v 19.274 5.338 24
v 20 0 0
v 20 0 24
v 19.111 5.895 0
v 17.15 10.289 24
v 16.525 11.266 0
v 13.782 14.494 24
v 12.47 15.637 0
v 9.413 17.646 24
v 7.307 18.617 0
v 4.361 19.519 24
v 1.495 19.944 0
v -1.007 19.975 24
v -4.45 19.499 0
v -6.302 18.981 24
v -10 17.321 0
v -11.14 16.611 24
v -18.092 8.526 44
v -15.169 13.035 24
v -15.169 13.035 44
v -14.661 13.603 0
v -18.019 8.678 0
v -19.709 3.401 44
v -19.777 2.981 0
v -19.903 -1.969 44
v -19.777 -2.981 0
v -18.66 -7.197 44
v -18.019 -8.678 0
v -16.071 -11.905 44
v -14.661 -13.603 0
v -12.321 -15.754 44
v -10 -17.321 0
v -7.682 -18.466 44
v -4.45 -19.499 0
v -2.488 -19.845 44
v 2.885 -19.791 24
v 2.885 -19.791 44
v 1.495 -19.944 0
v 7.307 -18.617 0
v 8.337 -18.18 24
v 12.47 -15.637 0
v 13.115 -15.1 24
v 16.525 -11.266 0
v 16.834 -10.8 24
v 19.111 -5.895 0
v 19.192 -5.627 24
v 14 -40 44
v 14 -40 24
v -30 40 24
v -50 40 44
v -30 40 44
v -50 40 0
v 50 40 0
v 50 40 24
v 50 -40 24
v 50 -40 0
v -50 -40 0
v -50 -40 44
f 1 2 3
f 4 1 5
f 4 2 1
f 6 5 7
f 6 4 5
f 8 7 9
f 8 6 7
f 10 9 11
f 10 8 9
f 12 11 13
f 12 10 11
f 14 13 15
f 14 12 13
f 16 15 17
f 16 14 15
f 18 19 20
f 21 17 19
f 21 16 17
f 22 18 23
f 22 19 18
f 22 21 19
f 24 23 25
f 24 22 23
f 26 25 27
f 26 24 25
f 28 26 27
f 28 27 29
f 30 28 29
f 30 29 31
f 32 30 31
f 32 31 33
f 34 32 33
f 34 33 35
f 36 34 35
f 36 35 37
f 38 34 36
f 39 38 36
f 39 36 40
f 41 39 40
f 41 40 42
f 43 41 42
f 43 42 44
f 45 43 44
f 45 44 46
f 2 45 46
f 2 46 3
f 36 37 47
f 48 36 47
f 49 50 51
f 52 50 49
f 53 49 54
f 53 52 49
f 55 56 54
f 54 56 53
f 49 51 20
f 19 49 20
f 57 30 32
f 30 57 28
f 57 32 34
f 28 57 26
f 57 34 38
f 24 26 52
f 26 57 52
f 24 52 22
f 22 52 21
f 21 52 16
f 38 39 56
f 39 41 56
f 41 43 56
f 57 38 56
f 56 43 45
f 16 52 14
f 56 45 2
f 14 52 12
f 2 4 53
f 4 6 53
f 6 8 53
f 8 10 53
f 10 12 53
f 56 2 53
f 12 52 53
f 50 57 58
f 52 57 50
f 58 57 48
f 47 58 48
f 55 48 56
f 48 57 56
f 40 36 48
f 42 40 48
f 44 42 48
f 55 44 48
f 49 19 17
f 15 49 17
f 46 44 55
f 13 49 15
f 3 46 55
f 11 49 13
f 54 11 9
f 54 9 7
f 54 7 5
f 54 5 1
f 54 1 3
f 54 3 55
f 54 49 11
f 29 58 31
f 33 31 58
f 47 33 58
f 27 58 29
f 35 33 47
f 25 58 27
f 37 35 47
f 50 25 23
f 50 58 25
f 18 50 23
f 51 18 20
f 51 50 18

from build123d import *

# Parameters (mm, degrees)
F0_W     = 100
F0_H     = 80
F0_R     = 20
F1_DEPTH = 44
F3_DEPTH = 20


with BuildPart() as f1:
    # F0 (on Top) → F1 (new body)
    with BuildSketch(Plane.XY):
        Rectangle(F0_W, F0_H)
        Circle(F0_R, mode=Mode.SUBTRACT)
    extrude(amount=F1_DEPTH)

    # F2 (on face) → F3 (cut)
    with BuildSketch(Plane.XY.offset(44)):
        with BuildLine():
            Line((50, -40), (50, 40))
            Line((50, 40), (-30, 40))
            Line((-30, 40), (-15.1690265486, 13.0345937247))
            ThreePointArc((-15.1690265486, 13.0345937247), (6.9505204492, 18.7534067701), (20, 0))
            ThreePointArc((20, 0), (15.1277749358, -13.0824472287), (2.8849574507, -19.7908317285))
            Line((2.8849574507, -19.7908317285), (14, -40))
            Line((14, -40), (50, -40))
        make_face()
    extrude(amount=-F3_DEPTH, mode=Mode.SUBTRACT)


solid = f1.part
